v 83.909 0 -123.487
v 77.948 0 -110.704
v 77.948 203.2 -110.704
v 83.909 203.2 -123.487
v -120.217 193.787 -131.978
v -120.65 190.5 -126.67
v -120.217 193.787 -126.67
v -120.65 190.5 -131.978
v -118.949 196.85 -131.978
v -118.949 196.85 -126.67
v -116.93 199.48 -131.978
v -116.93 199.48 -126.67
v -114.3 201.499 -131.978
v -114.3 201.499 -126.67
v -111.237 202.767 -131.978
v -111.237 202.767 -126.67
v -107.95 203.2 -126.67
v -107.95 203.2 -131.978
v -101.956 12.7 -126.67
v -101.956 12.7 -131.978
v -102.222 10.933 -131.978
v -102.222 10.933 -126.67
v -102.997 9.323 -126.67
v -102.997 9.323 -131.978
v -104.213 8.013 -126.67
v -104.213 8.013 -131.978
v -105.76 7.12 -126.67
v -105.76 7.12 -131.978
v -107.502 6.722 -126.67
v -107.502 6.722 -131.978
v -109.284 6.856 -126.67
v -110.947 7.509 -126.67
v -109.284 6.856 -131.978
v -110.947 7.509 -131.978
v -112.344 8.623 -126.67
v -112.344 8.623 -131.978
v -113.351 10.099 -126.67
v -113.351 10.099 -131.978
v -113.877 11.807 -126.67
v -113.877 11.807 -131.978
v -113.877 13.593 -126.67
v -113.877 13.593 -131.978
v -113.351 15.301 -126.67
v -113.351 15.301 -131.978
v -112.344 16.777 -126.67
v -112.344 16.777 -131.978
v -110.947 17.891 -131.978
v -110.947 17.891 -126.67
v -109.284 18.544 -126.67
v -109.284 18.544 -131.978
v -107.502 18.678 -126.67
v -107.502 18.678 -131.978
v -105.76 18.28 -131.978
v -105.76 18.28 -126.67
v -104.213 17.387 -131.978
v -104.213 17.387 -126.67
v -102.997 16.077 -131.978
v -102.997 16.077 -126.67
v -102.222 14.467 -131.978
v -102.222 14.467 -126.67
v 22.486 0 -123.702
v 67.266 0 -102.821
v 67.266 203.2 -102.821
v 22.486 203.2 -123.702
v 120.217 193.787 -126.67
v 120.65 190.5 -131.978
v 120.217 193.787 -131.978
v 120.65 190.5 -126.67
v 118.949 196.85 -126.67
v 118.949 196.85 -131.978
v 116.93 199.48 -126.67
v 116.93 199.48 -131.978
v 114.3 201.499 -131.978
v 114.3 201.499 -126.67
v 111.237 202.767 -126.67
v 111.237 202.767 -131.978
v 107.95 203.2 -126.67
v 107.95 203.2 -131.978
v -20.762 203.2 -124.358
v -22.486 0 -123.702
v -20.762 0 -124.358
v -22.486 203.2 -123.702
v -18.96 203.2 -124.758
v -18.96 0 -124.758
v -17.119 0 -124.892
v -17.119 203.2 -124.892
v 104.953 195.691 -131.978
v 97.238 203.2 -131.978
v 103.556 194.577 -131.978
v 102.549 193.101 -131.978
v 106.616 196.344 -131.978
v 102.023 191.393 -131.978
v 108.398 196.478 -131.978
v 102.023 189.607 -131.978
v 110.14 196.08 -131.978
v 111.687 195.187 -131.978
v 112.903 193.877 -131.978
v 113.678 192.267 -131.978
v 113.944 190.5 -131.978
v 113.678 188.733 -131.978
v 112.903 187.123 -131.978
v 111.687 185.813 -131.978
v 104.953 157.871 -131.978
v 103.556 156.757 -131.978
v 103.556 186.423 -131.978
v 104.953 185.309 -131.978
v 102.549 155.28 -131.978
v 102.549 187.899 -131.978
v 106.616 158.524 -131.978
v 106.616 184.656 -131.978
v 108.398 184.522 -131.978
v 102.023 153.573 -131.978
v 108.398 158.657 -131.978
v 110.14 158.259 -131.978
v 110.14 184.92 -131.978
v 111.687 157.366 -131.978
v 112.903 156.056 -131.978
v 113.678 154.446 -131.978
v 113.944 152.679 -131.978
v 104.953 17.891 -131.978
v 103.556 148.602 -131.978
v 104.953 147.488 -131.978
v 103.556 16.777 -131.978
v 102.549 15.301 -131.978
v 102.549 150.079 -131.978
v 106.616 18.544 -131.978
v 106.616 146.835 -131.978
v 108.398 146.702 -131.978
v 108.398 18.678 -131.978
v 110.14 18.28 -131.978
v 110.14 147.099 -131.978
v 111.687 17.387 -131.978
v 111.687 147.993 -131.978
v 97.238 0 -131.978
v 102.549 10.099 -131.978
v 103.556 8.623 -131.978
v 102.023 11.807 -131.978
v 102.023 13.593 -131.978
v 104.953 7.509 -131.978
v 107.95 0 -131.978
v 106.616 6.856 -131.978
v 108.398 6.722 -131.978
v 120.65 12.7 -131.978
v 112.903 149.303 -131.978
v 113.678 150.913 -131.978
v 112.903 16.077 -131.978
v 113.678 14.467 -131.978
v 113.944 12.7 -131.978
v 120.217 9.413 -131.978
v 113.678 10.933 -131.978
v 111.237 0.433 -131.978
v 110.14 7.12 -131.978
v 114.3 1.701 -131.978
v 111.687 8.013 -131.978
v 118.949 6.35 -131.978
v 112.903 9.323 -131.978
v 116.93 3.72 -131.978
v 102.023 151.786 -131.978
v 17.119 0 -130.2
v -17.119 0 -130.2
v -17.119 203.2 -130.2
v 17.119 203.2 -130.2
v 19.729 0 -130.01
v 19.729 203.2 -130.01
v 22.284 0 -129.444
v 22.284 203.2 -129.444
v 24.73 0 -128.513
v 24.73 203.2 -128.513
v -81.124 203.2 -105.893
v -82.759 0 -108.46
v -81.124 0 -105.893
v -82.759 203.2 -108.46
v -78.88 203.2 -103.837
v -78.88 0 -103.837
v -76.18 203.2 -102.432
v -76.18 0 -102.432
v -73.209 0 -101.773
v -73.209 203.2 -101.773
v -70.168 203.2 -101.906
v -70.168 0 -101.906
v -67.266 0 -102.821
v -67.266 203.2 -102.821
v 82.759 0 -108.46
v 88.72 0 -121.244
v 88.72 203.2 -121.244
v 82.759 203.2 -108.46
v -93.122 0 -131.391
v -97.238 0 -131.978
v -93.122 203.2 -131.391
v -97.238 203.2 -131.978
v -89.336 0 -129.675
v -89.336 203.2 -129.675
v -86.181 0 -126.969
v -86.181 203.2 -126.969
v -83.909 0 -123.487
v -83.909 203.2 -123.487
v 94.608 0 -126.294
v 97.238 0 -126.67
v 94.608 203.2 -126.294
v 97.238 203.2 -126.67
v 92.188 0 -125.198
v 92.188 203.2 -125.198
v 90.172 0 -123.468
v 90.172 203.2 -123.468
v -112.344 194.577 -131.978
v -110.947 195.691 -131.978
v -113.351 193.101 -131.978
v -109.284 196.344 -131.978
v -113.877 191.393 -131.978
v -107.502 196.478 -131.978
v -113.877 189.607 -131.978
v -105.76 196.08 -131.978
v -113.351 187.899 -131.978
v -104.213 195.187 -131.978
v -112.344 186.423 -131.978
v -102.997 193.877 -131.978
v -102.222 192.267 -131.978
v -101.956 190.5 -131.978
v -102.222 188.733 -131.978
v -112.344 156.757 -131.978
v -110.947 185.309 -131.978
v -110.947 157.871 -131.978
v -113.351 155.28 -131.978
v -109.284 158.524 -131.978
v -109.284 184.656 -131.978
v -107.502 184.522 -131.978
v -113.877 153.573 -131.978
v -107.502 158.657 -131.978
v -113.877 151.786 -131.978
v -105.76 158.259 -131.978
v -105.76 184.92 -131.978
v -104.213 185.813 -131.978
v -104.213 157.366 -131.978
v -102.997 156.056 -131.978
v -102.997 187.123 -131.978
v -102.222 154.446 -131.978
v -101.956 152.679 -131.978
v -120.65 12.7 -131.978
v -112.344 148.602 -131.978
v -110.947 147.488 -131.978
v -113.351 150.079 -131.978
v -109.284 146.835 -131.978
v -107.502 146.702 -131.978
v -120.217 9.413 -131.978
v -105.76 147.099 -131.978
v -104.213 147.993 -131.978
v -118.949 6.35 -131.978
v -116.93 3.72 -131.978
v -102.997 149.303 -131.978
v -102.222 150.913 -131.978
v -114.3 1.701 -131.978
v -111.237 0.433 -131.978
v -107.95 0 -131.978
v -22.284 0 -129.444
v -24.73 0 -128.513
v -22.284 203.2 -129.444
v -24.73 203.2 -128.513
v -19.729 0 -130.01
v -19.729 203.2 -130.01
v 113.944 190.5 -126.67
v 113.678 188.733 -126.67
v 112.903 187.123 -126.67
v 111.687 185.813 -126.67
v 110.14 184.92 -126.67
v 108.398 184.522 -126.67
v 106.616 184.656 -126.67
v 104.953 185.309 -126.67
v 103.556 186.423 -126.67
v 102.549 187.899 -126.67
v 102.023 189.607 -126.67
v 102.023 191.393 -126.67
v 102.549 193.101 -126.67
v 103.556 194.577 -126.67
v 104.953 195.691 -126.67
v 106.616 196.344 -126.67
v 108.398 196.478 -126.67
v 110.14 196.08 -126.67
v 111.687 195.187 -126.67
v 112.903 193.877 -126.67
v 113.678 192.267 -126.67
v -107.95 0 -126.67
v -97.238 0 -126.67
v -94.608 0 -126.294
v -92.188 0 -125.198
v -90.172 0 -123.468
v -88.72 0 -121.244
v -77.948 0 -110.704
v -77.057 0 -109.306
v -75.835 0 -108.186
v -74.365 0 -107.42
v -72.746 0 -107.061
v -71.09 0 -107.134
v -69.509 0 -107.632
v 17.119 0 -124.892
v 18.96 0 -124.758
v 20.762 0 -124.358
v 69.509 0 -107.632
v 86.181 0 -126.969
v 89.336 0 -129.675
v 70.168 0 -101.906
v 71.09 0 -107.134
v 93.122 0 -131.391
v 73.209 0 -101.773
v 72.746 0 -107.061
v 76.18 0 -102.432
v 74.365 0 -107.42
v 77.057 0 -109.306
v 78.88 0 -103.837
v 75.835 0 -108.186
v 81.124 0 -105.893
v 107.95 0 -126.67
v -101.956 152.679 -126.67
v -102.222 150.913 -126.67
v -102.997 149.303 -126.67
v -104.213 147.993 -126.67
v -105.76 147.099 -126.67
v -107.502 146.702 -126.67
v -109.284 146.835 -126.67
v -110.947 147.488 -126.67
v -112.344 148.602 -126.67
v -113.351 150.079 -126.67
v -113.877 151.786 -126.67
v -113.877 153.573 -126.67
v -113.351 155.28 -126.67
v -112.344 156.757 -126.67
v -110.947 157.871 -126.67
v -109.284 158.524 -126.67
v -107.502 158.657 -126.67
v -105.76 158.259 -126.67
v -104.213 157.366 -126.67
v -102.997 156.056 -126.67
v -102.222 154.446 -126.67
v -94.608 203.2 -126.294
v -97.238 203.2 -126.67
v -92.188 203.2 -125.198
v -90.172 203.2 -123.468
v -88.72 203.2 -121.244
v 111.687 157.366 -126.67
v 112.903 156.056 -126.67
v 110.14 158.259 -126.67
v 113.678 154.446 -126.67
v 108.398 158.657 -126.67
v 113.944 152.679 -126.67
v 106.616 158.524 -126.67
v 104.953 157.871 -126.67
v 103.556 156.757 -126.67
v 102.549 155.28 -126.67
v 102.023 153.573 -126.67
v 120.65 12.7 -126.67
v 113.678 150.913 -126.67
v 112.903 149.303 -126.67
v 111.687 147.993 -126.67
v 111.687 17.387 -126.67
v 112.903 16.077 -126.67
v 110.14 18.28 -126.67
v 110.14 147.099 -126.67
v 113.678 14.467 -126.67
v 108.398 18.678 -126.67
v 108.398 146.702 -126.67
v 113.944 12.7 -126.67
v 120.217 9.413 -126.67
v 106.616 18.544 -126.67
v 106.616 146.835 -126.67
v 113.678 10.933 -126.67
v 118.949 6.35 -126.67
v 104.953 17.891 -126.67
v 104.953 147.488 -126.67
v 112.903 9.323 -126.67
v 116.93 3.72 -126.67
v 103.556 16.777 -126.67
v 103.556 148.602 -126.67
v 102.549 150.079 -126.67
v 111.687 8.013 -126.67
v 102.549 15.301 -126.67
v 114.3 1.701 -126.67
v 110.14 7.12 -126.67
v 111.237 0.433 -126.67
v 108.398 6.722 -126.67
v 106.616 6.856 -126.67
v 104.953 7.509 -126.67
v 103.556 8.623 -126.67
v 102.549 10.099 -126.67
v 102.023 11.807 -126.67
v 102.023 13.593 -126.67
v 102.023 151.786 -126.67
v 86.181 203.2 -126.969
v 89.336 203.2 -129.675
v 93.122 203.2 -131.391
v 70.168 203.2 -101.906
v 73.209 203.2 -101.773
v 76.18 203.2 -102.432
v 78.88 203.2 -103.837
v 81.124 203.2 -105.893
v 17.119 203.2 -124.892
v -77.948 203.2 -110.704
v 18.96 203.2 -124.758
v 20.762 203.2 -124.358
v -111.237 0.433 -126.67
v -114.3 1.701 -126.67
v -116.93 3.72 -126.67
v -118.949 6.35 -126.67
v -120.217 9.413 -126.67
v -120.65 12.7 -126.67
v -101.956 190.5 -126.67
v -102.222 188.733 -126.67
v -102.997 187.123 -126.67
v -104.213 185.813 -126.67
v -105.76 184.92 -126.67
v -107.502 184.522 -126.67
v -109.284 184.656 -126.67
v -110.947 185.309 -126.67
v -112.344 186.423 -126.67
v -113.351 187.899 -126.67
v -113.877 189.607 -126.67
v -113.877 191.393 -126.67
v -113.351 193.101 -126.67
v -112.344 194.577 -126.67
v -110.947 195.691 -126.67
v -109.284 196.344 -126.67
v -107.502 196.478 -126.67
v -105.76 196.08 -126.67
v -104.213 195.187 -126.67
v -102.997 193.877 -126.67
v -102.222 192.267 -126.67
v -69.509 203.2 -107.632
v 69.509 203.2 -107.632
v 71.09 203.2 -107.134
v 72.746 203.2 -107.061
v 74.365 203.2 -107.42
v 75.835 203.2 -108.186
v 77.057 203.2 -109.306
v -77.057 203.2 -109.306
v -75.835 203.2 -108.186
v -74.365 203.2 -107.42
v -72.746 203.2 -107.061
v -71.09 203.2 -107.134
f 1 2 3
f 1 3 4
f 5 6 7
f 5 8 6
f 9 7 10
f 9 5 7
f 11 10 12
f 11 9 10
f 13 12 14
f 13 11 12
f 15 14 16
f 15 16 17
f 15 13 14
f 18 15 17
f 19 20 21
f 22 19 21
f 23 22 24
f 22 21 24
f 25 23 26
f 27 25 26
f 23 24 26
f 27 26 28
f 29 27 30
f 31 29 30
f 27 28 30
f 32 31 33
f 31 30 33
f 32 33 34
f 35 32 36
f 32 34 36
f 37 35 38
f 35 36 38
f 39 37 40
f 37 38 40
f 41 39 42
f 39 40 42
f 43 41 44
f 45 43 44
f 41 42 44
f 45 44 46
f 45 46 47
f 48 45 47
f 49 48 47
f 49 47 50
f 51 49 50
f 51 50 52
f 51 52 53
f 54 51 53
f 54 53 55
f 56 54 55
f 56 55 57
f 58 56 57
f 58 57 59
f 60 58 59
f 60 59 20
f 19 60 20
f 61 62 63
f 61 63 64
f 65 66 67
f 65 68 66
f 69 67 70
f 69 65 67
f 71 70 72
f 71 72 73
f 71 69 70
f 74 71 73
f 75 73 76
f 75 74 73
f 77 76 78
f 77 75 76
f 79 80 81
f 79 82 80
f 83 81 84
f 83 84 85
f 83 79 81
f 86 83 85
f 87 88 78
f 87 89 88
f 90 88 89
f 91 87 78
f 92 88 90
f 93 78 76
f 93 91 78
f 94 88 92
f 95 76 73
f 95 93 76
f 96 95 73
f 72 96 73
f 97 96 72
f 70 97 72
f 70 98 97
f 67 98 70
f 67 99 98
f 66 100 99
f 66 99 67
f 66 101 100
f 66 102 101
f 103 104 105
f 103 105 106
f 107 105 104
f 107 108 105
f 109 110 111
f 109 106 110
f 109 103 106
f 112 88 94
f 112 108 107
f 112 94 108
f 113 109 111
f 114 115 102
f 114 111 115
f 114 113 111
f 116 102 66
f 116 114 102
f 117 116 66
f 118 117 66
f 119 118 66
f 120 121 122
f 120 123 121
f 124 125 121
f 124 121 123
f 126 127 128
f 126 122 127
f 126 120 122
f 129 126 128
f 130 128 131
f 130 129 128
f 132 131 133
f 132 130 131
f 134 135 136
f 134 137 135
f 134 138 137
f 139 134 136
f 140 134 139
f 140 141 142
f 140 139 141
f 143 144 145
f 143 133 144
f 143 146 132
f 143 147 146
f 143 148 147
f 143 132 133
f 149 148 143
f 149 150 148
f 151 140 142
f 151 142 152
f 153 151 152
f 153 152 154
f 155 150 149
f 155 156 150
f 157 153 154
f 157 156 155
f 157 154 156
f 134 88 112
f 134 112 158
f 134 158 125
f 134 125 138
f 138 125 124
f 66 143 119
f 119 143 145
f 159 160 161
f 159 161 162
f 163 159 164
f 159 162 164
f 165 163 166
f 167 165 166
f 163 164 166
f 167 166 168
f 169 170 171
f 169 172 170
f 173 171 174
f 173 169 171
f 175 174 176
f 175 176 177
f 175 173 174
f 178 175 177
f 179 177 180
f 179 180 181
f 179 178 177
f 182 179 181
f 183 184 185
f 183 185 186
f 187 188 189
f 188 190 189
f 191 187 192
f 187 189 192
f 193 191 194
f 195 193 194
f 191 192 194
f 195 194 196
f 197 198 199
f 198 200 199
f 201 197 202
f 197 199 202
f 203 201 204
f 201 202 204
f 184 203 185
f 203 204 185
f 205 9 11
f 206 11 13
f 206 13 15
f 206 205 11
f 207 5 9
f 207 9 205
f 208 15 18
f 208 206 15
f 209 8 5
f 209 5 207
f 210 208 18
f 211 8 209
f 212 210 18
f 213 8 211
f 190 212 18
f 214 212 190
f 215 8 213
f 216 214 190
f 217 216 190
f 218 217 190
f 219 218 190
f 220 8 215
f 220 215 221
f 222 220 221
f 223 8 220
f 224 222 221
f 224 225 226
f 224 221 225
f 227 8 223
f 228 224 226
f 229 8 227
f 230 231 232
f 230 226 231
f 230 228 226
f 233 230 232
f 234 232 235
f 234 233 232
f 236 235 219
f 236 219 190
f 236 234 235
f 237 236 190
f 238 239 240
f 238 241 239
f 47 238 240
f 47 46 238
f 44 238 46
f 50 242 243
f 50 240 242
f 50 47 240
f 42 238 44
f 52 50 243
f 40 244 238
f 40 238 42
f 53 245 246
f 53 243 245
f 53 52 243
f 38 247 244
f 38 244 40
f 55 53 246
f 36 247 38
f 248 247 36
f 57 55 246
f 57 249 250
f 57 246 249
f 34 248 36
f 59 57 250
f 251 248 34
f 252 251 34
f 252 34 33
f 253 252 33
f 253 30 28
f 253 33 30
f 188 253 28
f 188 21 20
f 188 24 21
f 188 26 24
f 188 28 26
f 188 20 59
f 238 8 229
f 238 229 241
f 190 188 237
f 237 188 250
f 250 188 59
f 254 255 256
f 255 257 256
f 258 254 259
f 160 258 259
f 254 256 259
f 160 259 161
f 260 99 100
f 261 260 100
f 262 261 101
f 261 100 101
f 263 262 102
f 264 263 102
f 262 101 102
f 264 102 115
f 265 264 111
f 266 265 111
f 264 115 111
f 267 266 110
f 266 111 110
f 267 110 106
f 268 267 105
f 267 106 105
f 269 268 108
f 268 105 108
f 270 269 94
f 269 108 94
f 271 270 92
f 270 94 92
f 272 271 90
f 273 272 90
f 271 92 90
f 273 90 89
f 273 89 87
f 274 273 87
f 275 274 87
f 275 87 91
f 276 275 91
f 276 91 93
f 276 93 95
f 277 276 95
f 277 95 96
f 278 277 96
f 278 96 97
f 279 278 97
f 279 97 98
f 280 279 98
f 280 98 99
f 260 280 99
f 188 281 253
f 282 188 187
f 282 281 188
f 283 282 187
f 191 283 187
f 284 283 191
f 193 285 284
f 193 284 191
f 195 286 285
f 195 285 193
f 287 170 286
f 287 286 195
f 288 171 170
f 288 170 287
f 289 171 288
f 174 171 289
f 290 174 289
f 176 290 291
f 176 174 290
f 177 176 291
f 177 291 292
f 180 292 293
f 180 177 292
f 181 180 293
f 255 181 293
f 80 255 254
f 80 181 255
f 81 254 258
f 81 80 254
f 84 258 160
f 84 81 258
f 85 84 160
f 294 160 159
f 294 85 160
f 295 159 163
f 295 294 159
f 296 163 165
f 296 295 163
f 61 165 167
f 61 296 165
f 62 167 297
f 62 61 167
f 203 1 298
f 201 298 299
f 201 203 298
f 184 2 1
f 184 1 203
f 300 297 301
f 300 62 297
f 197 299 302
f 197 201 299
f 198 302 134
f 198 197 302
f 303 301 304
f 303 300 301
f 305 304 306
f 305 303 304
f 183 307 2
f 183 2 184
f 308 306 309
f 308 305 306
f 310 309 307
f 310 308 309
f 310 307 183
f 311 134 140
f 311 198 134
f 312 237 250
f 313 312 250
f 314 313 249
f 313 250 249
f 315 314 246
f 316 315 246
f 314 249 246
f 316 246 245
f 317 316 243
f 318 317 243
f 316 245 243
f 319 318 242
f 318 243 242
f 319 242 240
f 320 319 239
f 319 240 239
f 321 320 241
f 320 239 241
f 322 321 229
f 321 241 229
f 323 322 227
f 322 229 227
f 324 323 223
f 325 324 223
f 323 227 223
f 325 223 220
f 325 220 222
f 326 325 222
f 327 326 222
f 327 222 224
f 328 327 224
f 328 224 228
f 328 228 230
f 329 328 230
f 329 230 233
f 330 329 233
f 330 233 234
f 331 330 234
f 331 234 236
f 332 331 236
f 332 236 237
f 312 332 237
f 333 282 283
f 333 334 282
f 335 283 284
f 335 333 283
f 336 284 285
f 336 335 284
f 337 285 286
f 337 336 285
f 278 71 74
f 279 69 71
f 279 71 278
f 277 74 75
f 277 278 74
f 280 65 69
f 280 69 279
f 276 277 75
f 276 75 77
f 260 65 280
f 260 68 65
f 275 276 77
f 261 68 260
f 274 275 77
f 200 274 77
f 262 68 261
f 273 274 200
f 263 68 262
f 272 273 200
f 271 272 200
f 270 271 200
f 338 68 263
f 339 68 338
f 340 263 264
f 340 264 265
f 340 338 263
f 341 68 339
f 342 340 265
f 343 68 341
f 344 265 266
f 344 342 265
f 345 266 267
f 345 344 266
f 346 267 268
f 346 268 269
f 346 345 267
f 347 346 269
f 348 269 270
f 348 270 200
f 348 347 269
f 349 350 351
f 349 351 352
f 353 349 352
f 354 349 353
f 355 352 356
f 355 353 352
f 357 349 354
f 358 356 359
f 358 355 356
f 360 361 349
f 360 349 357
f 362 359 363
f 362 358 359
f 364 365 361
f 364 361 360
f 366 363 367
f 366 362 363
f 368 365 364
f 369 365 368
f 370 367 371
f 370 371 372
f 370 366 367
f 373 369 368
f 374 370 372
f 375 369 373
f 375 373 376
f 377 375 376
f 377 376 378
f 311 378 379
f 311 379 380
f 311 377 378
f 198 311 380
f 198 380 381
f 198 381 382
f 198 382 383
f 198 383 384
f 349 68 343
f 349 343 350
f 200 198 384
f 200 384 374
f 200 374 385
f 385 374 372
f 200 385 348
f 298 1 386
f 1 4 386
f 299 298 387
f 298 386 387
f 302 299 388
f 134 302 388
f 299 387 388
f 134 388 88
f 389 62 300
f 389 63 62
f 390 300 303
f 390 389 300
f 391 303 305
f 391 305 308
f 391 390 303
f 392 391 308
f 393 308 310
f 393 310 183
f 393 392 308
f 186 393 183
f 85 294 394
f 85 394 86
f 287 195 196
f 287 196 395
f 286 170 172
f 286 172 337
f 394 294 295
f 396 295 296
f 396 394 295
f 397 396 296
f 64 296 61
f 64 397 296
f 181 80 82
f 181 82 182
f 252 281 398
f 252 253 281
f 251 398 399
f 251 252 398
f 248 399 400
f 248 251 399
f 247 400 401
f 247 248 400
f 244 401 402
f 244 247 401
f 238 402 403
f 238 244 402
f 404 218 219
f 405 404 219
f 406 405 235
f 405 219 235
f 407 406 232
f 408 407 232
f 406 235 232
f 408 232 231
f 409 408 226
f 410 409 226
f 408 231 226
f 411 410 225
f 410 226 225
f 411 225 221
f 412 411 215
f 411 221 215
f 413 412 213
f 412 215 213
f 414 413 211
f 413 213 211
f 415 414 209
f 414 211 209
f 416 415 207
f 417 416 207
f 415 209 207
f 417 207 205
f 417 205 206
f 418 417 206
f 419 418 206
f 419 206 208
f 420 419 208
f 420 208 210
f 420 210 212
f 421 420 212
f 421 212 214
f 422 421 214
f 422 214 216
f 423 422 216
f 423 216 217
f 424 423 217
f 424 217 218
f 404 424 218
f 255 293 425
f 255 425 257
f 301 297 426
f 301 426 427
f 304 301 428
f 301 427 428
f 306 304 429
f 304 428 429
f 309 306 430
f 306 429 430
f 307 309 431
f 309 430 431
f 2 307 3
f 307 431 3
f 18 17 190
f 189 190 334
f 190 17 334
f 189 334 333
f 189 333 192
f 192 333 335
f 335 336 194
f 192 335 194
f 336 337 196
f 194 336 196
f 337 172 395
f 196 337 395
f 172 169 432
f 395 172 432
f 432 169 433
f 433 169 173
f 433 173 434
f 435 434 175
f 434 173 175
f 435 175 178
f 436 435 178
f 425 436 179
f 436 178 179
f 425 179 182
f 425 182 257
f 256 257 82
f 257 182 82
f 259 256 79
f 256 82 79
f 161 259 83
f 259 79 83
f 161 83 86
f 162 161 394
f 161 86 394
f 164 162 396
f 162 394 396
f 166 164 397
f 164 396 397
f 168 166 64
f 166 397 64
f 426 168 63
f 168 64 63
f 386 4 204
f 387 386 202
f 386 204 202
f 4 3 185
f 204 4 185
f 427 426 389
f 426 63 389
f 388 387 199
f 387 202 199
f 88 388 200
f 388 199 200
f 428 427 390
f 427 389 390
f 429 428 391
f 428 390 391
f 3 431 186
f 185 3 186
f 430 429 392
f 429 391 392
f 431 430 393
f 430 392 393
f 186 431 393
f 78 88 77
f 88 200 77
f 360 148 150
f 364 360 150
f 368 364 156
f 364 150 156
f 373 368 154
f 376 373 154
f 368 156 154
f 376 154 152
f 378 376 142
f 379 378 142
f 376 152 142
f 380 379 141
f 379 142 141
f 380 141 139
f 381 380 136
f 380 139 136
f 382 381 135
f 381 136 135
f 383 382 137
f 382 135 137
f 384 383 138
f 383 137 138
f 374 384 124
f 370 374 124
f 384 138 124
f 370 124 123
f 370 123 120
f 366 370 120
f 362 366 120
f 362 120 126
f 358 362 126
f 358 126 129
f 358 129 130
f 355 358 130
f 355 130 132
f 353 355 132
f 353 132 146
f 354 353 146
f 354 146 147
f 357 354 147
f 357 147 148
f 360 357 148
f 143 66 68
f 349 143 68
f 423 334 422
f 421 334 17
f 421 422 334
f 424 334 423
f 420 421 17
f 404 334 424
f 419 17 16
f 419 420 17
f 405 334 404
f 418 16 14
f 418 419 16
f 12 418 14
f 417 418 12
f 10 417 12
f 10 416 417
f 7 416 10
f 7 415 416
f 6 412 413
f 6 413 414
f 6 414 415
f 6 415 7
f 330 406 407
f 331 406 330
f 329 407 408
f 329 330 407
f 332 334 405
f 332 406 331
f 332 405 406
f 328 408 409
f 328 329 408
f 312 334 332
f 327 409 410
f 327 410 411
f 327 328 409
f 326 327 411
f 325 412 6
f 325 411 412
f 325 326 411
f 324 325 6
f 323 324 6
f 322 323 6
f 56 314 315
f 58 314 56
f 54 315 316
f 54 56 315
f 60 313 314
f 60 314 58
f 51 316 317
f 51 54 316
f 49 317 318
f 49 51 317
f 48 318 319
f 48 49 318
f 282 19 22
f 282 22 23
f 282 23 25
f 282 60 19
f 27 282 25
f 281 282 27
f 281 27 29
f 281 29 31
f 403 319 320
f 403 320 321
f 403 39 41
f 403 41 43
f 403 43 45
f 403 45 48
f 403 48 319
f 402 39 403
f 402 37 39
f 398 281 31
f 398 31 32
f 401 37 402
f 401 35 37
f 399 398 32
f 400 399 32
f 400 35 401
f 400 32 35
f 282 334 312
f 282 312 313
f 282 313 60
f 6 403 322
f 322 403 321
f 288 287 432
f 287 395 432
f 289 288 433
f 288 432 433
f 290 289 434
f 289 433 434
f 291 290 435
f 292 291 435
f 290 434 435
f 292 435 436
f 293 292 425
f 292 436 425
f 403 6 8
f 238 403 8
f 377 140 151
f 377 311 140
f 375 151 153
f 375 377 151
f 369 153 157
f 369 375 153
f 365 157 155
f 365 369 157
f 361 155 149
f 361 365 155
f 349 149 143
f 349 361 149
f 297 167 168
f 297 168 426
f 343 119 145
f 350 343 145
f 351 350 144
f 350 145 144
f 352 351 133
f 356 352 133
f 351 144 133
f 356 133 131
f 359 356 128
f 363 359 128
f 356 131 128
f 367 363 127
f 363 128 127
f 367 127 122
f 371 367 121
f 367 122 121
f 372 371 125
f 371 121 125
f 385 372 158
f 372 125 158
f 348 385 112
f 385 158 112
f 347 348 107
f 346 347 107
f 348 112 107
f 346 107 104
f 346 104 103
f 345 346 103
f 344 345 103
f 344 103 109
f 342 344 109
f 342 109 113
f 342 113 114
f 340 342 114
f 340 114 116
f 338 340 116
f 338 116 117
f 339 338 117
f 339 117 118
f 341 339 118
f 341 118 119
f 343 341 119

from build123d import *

# Parameters (mm, degrees)
F1_DEPTH = 203.2
F2_R     = 5.9944
F3_DEPTH = 34.085578
F4_R     = 6.35
F5_R     = 11.6586
F6_R     = 12.7
F7_R     = 18.0086
F8_R     = 9.398
F9_R     = 14.7066
F10_R    = 12.7


with BuildPart() as f1:
    # F0 (on Front) → F1 (new body)
    with BuildSketch(Plane.XZ):
        Polygon((77.8321, -97.893822), (19.934749, -124.8918), (0, -124.8918), (-19.934749, -124.8918), (-77.8321, -97.893822), (-91.250559, -126.6698), (-120.65, -126.6698), (-120.65, -131.9784), (-87.868608, -131.9784), (-75.264386, -104.948559), (-21.111638, -130.2004), (0, -130.2004), (21.111638, -130.2004), (75.264386, -104.948559), (87.868608, -131.9784), (120.65, -131.9784), (120.65, -126.6698), (91.250559, -126.6698), align=None)
    extrude(amount=-F1_DEPTH)

    # F2 (on face) → F3 (cut, through all)
    with BuildSketch(Plane(origin=(0, 0, -131.9784), x_dir=(1, 0, 0), z_dir=(0, 0, -1))):
        with Locations((107.95, -12.7)):
            Circle(F2_R)
        with Locations((107.95, -152.6794)):
            Circle(F2_R)
        with Locations((107.95, -190.5)):
            Circle(F2_R)
        with Locations((-107.95, -190.5)):
            Circle(F2_R)
        with Locations((-107.95, -152.6794)):
            Circle(F2_R)
        with Locations((-107.95, -12.7)):
            Circle(F2_R)
    extrude(amount=-F3_DEPTH, mode=Mode.SUBTRACT)

    # F4
    f4_edges = [f1.edges().sort_by_distance(p)[0] for p in [
        (-75.264386, 101.6, -104.948559),
        (75.264386, 101.6, -104.948559),
    ]]
    fillet(f4_edges, radius=F4_R)

    # F5
    f5_edges = [f1.edges().sort_by_distance(p)[0] for p in [
        (77.8321, 101.6, -97.893822),
        (-77.8321, 101.6, -97.893822),
    ]]
    fillet(f5_edges, radius=F5_R)

    # F6
    f6_edges = [f1.edges().sort_by_distance(p)[0] for p in [
        (-19.934749, 101.6, -124.8918),
        (19.934749, 101.6, -124.8918),
    ]]
    fillet(f6_edges, radius=F6_R)

    # F7
    f7_edges = [f1.edges().sort_by_distance(p)[0] for p in [
        (-21.111638, 101.6, -130.2004),
        (21.111638, 101.6, -130.2004),
    ]]
    fillet(f7_edges, radius=F7_R)

    # F8
    f8_edges = [f1.edges().sort_by_distance(p)[0] for p in [
        (-91.250559, 101.6, -126.6698),
        (91.250559, 101.6, -126.6698),
    ]]
    fillet(f8_edges, radius=F8_R)

    # F9
    f9_edges = [f1.edges().sort_by_distance(p)[0] for p in [
        (-87.868608, 101.6, -131.9784),
        (87.868608, 101.6, -131.9784),
    ]]
    fillet(f9_edges, radius=F9_R)

    # F10
    f10_edges = [f1.edges().sort_by_distance(p)[0] for p in [
        (-120.65, 0, -129.3241),
        (120.65, 0, -129.3241),
        (-120.65, 203.2, -129.3241),
        (120.65, 203.2, -129.3241),
    ]]
    fillet(f10_edges, radius=F10_R)


solid = f1.part
